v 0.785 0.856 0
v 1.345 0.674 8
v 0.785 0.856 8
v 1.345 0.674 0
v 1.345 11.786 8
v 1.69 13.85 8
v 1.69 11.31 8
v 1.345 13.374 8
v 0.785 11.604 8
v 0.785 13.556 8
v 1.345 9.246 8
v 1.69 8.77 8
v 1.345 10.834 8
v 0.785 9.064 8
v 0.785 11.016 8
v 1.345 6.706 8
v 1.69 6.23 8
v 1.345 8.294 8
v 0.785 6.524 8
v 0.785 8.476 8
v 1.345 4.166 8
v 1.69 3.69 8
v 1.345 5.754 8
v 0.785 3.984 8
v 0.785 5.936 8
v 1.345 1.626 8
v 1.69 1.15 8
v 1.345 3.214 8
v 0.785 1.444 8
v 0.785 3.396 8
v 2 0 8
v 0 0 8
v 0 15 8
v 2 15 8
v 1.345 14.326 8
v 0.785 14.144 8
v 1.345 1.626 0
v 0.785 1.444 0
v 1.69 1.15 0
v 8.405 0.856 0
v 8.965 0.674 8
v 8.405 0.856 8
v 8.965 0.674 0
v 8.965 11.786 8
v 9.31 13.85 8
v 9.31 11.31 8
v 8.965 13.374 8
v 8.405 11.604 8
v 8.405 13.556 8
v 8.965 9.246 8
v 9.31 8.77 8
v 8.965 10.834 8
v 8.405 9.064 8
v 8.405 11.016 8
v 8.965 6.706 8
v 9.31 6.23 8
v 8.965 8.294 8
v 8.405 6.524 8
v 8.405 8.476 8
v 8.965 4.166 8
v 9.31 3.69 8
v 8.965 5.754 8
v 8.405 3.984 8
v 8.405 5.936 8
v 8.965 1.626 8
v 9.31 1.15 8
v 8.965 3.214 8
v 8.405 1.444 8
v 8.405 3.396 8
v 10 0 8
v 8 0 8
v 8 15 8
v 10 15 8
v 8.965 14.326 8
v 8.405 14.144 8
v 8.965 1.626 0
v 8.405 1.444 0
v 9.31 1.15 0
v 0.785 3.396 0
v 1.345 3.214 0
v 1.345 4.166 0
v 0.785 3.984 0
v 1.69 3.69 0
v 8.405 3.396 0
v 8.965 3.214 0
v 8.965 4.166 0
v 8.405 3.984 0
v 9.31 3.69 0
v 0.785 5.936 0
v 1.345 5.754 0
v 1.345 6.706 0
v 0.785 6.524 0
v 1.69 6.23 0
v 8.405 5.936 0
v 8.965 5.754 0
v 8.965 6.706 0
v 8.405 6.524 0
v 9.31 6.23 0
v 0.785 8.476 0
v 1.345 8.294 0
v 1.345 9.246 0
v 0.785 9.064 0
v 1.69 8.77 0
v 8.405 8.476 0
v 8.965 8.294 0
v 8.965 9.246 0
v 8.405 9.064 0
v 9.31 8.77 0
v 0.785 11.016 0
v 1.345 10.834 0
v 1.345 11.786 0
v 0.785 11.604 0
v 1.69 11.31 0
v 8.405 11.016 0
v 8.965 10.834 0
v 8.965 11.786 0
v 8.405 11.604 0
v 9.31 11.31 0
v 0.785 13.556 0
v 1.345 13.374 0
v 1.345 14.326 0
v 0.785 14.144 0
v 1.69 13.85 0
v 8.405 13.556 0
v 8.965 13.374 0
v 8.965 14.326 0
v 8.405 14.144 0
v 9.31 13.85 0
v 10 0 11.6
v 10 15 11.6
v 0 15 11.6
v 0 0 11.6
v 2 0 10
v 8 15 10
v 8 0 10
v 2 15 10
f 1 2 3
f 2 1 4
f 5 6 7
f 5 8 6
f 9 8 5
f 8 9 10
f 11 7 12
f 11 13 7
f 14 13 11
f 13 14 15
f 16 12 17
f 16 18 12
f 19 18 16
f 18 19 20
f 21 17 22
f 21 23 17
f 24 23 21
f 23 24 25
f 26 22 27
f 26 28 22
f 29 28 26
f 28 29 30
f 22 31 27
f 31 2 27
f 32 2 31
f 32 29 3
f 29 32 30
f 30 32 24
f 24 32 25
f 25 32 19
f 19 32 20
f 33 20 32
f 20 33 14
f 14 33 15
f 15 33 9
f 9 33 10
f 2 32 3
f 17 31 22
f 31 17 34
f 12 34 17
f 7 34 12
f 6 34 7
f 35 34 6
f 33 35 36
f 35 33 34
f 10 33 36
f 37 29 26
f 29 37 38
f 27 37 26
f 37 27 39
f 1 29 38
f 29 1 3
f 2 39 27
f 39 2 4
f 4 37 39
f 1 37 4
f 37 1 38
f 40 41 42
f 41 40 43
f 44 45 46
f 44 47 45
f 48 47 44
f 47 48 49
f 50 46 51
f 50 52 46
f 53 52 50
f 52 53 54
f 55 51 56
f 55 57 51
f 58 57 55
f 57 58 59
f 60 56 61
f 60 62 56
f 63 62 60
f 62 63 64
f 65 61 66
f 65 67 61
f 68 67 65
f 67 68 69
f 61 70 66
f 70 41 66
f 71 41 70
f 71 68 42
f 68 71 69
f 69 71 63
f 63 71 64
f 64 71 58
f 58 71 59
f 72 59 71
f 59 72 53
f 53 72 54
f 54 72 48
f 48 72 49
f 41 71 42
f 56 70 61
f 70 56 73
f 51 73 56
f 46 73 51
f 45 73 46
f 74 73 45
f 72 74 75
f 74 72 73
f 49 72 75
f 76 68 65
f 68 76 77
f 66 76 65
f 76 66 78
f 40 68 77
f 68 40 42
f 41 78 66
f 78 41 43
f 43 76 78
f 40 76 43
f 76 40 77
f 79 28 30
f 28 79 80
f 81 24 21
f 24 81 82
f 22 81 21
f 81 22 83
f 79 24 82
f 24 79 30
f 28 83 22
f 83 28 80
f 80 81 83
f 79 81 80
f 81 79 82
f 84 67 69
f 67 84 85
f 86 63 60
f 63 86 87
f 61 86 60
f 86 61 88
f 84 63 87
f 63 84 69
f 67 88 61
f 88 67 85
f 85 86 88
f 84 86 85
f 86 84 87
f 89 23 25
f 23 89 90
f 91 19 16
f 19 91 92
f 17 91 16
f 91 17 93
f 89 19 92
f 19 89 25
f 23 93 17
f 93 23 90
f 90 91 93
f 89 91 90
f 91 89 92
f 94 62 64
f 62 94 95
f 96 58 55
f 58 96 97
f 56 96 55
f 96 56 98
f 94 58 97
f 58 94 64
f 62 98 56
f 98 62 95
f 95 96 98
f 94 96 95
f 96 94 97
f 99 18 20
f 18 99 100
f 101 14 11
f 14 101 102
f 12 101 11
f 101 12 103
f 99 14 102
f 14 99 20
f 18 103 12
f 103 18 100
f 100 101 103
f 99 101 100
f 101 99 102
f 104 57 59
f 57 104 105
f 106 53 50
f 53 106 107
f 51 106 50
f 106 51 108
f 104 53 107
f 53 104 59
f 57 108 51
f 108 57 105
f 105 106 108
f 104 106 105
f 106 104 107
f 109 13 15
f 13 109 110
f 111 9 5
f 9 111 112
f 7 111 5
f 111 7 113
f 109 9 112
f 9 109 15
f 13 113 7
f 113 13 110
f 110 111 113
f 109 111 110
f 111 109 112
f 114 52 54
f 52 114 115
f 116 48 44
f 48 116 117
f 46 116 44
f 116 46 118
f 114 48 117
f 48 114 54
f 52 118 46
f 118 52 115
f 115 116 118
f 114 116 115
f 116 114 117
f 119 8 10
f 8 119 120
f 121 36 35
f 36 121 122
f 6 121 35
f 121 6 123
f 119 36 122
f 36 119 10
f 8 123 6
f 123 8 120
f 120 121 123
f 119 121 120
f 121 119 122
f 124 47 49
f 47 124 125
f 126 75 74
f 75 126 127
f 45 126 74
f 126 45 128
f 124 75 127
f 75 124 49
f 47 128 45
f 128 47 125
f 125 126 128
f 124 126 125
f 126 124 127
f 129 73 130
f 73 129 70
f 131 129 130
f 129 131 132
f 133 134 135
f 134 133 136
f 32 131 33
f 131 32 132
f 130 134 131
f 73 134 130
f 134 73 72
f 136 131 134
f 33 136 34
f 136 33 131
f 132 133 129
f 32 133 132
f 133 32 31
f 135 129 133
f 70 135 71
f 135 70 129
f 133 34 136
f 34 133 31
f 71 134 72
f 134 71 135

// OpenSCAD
//
//Motor Driver DRV8835
//https://akizukidenshi.com/goodsaffix/AE-DRV8835-S_20210526.pdf
//

motordriver_DRV8835();

module motordriver_DRV8835(){
  translate([0,0,10])cube([10,15,1.6]);
  translate([0,0,8])cube([2, 15, 2]);
  translate([8,0,8])cube([2, 15, 2]);
  for(length=[1.15: 2.54:15]){
   translate([1.19,length,0]) cylinder(h=8,r=0.5);
   translate([1.19+7.62,length,0]) cylinder(h=8,r=0.5);
  }
}
